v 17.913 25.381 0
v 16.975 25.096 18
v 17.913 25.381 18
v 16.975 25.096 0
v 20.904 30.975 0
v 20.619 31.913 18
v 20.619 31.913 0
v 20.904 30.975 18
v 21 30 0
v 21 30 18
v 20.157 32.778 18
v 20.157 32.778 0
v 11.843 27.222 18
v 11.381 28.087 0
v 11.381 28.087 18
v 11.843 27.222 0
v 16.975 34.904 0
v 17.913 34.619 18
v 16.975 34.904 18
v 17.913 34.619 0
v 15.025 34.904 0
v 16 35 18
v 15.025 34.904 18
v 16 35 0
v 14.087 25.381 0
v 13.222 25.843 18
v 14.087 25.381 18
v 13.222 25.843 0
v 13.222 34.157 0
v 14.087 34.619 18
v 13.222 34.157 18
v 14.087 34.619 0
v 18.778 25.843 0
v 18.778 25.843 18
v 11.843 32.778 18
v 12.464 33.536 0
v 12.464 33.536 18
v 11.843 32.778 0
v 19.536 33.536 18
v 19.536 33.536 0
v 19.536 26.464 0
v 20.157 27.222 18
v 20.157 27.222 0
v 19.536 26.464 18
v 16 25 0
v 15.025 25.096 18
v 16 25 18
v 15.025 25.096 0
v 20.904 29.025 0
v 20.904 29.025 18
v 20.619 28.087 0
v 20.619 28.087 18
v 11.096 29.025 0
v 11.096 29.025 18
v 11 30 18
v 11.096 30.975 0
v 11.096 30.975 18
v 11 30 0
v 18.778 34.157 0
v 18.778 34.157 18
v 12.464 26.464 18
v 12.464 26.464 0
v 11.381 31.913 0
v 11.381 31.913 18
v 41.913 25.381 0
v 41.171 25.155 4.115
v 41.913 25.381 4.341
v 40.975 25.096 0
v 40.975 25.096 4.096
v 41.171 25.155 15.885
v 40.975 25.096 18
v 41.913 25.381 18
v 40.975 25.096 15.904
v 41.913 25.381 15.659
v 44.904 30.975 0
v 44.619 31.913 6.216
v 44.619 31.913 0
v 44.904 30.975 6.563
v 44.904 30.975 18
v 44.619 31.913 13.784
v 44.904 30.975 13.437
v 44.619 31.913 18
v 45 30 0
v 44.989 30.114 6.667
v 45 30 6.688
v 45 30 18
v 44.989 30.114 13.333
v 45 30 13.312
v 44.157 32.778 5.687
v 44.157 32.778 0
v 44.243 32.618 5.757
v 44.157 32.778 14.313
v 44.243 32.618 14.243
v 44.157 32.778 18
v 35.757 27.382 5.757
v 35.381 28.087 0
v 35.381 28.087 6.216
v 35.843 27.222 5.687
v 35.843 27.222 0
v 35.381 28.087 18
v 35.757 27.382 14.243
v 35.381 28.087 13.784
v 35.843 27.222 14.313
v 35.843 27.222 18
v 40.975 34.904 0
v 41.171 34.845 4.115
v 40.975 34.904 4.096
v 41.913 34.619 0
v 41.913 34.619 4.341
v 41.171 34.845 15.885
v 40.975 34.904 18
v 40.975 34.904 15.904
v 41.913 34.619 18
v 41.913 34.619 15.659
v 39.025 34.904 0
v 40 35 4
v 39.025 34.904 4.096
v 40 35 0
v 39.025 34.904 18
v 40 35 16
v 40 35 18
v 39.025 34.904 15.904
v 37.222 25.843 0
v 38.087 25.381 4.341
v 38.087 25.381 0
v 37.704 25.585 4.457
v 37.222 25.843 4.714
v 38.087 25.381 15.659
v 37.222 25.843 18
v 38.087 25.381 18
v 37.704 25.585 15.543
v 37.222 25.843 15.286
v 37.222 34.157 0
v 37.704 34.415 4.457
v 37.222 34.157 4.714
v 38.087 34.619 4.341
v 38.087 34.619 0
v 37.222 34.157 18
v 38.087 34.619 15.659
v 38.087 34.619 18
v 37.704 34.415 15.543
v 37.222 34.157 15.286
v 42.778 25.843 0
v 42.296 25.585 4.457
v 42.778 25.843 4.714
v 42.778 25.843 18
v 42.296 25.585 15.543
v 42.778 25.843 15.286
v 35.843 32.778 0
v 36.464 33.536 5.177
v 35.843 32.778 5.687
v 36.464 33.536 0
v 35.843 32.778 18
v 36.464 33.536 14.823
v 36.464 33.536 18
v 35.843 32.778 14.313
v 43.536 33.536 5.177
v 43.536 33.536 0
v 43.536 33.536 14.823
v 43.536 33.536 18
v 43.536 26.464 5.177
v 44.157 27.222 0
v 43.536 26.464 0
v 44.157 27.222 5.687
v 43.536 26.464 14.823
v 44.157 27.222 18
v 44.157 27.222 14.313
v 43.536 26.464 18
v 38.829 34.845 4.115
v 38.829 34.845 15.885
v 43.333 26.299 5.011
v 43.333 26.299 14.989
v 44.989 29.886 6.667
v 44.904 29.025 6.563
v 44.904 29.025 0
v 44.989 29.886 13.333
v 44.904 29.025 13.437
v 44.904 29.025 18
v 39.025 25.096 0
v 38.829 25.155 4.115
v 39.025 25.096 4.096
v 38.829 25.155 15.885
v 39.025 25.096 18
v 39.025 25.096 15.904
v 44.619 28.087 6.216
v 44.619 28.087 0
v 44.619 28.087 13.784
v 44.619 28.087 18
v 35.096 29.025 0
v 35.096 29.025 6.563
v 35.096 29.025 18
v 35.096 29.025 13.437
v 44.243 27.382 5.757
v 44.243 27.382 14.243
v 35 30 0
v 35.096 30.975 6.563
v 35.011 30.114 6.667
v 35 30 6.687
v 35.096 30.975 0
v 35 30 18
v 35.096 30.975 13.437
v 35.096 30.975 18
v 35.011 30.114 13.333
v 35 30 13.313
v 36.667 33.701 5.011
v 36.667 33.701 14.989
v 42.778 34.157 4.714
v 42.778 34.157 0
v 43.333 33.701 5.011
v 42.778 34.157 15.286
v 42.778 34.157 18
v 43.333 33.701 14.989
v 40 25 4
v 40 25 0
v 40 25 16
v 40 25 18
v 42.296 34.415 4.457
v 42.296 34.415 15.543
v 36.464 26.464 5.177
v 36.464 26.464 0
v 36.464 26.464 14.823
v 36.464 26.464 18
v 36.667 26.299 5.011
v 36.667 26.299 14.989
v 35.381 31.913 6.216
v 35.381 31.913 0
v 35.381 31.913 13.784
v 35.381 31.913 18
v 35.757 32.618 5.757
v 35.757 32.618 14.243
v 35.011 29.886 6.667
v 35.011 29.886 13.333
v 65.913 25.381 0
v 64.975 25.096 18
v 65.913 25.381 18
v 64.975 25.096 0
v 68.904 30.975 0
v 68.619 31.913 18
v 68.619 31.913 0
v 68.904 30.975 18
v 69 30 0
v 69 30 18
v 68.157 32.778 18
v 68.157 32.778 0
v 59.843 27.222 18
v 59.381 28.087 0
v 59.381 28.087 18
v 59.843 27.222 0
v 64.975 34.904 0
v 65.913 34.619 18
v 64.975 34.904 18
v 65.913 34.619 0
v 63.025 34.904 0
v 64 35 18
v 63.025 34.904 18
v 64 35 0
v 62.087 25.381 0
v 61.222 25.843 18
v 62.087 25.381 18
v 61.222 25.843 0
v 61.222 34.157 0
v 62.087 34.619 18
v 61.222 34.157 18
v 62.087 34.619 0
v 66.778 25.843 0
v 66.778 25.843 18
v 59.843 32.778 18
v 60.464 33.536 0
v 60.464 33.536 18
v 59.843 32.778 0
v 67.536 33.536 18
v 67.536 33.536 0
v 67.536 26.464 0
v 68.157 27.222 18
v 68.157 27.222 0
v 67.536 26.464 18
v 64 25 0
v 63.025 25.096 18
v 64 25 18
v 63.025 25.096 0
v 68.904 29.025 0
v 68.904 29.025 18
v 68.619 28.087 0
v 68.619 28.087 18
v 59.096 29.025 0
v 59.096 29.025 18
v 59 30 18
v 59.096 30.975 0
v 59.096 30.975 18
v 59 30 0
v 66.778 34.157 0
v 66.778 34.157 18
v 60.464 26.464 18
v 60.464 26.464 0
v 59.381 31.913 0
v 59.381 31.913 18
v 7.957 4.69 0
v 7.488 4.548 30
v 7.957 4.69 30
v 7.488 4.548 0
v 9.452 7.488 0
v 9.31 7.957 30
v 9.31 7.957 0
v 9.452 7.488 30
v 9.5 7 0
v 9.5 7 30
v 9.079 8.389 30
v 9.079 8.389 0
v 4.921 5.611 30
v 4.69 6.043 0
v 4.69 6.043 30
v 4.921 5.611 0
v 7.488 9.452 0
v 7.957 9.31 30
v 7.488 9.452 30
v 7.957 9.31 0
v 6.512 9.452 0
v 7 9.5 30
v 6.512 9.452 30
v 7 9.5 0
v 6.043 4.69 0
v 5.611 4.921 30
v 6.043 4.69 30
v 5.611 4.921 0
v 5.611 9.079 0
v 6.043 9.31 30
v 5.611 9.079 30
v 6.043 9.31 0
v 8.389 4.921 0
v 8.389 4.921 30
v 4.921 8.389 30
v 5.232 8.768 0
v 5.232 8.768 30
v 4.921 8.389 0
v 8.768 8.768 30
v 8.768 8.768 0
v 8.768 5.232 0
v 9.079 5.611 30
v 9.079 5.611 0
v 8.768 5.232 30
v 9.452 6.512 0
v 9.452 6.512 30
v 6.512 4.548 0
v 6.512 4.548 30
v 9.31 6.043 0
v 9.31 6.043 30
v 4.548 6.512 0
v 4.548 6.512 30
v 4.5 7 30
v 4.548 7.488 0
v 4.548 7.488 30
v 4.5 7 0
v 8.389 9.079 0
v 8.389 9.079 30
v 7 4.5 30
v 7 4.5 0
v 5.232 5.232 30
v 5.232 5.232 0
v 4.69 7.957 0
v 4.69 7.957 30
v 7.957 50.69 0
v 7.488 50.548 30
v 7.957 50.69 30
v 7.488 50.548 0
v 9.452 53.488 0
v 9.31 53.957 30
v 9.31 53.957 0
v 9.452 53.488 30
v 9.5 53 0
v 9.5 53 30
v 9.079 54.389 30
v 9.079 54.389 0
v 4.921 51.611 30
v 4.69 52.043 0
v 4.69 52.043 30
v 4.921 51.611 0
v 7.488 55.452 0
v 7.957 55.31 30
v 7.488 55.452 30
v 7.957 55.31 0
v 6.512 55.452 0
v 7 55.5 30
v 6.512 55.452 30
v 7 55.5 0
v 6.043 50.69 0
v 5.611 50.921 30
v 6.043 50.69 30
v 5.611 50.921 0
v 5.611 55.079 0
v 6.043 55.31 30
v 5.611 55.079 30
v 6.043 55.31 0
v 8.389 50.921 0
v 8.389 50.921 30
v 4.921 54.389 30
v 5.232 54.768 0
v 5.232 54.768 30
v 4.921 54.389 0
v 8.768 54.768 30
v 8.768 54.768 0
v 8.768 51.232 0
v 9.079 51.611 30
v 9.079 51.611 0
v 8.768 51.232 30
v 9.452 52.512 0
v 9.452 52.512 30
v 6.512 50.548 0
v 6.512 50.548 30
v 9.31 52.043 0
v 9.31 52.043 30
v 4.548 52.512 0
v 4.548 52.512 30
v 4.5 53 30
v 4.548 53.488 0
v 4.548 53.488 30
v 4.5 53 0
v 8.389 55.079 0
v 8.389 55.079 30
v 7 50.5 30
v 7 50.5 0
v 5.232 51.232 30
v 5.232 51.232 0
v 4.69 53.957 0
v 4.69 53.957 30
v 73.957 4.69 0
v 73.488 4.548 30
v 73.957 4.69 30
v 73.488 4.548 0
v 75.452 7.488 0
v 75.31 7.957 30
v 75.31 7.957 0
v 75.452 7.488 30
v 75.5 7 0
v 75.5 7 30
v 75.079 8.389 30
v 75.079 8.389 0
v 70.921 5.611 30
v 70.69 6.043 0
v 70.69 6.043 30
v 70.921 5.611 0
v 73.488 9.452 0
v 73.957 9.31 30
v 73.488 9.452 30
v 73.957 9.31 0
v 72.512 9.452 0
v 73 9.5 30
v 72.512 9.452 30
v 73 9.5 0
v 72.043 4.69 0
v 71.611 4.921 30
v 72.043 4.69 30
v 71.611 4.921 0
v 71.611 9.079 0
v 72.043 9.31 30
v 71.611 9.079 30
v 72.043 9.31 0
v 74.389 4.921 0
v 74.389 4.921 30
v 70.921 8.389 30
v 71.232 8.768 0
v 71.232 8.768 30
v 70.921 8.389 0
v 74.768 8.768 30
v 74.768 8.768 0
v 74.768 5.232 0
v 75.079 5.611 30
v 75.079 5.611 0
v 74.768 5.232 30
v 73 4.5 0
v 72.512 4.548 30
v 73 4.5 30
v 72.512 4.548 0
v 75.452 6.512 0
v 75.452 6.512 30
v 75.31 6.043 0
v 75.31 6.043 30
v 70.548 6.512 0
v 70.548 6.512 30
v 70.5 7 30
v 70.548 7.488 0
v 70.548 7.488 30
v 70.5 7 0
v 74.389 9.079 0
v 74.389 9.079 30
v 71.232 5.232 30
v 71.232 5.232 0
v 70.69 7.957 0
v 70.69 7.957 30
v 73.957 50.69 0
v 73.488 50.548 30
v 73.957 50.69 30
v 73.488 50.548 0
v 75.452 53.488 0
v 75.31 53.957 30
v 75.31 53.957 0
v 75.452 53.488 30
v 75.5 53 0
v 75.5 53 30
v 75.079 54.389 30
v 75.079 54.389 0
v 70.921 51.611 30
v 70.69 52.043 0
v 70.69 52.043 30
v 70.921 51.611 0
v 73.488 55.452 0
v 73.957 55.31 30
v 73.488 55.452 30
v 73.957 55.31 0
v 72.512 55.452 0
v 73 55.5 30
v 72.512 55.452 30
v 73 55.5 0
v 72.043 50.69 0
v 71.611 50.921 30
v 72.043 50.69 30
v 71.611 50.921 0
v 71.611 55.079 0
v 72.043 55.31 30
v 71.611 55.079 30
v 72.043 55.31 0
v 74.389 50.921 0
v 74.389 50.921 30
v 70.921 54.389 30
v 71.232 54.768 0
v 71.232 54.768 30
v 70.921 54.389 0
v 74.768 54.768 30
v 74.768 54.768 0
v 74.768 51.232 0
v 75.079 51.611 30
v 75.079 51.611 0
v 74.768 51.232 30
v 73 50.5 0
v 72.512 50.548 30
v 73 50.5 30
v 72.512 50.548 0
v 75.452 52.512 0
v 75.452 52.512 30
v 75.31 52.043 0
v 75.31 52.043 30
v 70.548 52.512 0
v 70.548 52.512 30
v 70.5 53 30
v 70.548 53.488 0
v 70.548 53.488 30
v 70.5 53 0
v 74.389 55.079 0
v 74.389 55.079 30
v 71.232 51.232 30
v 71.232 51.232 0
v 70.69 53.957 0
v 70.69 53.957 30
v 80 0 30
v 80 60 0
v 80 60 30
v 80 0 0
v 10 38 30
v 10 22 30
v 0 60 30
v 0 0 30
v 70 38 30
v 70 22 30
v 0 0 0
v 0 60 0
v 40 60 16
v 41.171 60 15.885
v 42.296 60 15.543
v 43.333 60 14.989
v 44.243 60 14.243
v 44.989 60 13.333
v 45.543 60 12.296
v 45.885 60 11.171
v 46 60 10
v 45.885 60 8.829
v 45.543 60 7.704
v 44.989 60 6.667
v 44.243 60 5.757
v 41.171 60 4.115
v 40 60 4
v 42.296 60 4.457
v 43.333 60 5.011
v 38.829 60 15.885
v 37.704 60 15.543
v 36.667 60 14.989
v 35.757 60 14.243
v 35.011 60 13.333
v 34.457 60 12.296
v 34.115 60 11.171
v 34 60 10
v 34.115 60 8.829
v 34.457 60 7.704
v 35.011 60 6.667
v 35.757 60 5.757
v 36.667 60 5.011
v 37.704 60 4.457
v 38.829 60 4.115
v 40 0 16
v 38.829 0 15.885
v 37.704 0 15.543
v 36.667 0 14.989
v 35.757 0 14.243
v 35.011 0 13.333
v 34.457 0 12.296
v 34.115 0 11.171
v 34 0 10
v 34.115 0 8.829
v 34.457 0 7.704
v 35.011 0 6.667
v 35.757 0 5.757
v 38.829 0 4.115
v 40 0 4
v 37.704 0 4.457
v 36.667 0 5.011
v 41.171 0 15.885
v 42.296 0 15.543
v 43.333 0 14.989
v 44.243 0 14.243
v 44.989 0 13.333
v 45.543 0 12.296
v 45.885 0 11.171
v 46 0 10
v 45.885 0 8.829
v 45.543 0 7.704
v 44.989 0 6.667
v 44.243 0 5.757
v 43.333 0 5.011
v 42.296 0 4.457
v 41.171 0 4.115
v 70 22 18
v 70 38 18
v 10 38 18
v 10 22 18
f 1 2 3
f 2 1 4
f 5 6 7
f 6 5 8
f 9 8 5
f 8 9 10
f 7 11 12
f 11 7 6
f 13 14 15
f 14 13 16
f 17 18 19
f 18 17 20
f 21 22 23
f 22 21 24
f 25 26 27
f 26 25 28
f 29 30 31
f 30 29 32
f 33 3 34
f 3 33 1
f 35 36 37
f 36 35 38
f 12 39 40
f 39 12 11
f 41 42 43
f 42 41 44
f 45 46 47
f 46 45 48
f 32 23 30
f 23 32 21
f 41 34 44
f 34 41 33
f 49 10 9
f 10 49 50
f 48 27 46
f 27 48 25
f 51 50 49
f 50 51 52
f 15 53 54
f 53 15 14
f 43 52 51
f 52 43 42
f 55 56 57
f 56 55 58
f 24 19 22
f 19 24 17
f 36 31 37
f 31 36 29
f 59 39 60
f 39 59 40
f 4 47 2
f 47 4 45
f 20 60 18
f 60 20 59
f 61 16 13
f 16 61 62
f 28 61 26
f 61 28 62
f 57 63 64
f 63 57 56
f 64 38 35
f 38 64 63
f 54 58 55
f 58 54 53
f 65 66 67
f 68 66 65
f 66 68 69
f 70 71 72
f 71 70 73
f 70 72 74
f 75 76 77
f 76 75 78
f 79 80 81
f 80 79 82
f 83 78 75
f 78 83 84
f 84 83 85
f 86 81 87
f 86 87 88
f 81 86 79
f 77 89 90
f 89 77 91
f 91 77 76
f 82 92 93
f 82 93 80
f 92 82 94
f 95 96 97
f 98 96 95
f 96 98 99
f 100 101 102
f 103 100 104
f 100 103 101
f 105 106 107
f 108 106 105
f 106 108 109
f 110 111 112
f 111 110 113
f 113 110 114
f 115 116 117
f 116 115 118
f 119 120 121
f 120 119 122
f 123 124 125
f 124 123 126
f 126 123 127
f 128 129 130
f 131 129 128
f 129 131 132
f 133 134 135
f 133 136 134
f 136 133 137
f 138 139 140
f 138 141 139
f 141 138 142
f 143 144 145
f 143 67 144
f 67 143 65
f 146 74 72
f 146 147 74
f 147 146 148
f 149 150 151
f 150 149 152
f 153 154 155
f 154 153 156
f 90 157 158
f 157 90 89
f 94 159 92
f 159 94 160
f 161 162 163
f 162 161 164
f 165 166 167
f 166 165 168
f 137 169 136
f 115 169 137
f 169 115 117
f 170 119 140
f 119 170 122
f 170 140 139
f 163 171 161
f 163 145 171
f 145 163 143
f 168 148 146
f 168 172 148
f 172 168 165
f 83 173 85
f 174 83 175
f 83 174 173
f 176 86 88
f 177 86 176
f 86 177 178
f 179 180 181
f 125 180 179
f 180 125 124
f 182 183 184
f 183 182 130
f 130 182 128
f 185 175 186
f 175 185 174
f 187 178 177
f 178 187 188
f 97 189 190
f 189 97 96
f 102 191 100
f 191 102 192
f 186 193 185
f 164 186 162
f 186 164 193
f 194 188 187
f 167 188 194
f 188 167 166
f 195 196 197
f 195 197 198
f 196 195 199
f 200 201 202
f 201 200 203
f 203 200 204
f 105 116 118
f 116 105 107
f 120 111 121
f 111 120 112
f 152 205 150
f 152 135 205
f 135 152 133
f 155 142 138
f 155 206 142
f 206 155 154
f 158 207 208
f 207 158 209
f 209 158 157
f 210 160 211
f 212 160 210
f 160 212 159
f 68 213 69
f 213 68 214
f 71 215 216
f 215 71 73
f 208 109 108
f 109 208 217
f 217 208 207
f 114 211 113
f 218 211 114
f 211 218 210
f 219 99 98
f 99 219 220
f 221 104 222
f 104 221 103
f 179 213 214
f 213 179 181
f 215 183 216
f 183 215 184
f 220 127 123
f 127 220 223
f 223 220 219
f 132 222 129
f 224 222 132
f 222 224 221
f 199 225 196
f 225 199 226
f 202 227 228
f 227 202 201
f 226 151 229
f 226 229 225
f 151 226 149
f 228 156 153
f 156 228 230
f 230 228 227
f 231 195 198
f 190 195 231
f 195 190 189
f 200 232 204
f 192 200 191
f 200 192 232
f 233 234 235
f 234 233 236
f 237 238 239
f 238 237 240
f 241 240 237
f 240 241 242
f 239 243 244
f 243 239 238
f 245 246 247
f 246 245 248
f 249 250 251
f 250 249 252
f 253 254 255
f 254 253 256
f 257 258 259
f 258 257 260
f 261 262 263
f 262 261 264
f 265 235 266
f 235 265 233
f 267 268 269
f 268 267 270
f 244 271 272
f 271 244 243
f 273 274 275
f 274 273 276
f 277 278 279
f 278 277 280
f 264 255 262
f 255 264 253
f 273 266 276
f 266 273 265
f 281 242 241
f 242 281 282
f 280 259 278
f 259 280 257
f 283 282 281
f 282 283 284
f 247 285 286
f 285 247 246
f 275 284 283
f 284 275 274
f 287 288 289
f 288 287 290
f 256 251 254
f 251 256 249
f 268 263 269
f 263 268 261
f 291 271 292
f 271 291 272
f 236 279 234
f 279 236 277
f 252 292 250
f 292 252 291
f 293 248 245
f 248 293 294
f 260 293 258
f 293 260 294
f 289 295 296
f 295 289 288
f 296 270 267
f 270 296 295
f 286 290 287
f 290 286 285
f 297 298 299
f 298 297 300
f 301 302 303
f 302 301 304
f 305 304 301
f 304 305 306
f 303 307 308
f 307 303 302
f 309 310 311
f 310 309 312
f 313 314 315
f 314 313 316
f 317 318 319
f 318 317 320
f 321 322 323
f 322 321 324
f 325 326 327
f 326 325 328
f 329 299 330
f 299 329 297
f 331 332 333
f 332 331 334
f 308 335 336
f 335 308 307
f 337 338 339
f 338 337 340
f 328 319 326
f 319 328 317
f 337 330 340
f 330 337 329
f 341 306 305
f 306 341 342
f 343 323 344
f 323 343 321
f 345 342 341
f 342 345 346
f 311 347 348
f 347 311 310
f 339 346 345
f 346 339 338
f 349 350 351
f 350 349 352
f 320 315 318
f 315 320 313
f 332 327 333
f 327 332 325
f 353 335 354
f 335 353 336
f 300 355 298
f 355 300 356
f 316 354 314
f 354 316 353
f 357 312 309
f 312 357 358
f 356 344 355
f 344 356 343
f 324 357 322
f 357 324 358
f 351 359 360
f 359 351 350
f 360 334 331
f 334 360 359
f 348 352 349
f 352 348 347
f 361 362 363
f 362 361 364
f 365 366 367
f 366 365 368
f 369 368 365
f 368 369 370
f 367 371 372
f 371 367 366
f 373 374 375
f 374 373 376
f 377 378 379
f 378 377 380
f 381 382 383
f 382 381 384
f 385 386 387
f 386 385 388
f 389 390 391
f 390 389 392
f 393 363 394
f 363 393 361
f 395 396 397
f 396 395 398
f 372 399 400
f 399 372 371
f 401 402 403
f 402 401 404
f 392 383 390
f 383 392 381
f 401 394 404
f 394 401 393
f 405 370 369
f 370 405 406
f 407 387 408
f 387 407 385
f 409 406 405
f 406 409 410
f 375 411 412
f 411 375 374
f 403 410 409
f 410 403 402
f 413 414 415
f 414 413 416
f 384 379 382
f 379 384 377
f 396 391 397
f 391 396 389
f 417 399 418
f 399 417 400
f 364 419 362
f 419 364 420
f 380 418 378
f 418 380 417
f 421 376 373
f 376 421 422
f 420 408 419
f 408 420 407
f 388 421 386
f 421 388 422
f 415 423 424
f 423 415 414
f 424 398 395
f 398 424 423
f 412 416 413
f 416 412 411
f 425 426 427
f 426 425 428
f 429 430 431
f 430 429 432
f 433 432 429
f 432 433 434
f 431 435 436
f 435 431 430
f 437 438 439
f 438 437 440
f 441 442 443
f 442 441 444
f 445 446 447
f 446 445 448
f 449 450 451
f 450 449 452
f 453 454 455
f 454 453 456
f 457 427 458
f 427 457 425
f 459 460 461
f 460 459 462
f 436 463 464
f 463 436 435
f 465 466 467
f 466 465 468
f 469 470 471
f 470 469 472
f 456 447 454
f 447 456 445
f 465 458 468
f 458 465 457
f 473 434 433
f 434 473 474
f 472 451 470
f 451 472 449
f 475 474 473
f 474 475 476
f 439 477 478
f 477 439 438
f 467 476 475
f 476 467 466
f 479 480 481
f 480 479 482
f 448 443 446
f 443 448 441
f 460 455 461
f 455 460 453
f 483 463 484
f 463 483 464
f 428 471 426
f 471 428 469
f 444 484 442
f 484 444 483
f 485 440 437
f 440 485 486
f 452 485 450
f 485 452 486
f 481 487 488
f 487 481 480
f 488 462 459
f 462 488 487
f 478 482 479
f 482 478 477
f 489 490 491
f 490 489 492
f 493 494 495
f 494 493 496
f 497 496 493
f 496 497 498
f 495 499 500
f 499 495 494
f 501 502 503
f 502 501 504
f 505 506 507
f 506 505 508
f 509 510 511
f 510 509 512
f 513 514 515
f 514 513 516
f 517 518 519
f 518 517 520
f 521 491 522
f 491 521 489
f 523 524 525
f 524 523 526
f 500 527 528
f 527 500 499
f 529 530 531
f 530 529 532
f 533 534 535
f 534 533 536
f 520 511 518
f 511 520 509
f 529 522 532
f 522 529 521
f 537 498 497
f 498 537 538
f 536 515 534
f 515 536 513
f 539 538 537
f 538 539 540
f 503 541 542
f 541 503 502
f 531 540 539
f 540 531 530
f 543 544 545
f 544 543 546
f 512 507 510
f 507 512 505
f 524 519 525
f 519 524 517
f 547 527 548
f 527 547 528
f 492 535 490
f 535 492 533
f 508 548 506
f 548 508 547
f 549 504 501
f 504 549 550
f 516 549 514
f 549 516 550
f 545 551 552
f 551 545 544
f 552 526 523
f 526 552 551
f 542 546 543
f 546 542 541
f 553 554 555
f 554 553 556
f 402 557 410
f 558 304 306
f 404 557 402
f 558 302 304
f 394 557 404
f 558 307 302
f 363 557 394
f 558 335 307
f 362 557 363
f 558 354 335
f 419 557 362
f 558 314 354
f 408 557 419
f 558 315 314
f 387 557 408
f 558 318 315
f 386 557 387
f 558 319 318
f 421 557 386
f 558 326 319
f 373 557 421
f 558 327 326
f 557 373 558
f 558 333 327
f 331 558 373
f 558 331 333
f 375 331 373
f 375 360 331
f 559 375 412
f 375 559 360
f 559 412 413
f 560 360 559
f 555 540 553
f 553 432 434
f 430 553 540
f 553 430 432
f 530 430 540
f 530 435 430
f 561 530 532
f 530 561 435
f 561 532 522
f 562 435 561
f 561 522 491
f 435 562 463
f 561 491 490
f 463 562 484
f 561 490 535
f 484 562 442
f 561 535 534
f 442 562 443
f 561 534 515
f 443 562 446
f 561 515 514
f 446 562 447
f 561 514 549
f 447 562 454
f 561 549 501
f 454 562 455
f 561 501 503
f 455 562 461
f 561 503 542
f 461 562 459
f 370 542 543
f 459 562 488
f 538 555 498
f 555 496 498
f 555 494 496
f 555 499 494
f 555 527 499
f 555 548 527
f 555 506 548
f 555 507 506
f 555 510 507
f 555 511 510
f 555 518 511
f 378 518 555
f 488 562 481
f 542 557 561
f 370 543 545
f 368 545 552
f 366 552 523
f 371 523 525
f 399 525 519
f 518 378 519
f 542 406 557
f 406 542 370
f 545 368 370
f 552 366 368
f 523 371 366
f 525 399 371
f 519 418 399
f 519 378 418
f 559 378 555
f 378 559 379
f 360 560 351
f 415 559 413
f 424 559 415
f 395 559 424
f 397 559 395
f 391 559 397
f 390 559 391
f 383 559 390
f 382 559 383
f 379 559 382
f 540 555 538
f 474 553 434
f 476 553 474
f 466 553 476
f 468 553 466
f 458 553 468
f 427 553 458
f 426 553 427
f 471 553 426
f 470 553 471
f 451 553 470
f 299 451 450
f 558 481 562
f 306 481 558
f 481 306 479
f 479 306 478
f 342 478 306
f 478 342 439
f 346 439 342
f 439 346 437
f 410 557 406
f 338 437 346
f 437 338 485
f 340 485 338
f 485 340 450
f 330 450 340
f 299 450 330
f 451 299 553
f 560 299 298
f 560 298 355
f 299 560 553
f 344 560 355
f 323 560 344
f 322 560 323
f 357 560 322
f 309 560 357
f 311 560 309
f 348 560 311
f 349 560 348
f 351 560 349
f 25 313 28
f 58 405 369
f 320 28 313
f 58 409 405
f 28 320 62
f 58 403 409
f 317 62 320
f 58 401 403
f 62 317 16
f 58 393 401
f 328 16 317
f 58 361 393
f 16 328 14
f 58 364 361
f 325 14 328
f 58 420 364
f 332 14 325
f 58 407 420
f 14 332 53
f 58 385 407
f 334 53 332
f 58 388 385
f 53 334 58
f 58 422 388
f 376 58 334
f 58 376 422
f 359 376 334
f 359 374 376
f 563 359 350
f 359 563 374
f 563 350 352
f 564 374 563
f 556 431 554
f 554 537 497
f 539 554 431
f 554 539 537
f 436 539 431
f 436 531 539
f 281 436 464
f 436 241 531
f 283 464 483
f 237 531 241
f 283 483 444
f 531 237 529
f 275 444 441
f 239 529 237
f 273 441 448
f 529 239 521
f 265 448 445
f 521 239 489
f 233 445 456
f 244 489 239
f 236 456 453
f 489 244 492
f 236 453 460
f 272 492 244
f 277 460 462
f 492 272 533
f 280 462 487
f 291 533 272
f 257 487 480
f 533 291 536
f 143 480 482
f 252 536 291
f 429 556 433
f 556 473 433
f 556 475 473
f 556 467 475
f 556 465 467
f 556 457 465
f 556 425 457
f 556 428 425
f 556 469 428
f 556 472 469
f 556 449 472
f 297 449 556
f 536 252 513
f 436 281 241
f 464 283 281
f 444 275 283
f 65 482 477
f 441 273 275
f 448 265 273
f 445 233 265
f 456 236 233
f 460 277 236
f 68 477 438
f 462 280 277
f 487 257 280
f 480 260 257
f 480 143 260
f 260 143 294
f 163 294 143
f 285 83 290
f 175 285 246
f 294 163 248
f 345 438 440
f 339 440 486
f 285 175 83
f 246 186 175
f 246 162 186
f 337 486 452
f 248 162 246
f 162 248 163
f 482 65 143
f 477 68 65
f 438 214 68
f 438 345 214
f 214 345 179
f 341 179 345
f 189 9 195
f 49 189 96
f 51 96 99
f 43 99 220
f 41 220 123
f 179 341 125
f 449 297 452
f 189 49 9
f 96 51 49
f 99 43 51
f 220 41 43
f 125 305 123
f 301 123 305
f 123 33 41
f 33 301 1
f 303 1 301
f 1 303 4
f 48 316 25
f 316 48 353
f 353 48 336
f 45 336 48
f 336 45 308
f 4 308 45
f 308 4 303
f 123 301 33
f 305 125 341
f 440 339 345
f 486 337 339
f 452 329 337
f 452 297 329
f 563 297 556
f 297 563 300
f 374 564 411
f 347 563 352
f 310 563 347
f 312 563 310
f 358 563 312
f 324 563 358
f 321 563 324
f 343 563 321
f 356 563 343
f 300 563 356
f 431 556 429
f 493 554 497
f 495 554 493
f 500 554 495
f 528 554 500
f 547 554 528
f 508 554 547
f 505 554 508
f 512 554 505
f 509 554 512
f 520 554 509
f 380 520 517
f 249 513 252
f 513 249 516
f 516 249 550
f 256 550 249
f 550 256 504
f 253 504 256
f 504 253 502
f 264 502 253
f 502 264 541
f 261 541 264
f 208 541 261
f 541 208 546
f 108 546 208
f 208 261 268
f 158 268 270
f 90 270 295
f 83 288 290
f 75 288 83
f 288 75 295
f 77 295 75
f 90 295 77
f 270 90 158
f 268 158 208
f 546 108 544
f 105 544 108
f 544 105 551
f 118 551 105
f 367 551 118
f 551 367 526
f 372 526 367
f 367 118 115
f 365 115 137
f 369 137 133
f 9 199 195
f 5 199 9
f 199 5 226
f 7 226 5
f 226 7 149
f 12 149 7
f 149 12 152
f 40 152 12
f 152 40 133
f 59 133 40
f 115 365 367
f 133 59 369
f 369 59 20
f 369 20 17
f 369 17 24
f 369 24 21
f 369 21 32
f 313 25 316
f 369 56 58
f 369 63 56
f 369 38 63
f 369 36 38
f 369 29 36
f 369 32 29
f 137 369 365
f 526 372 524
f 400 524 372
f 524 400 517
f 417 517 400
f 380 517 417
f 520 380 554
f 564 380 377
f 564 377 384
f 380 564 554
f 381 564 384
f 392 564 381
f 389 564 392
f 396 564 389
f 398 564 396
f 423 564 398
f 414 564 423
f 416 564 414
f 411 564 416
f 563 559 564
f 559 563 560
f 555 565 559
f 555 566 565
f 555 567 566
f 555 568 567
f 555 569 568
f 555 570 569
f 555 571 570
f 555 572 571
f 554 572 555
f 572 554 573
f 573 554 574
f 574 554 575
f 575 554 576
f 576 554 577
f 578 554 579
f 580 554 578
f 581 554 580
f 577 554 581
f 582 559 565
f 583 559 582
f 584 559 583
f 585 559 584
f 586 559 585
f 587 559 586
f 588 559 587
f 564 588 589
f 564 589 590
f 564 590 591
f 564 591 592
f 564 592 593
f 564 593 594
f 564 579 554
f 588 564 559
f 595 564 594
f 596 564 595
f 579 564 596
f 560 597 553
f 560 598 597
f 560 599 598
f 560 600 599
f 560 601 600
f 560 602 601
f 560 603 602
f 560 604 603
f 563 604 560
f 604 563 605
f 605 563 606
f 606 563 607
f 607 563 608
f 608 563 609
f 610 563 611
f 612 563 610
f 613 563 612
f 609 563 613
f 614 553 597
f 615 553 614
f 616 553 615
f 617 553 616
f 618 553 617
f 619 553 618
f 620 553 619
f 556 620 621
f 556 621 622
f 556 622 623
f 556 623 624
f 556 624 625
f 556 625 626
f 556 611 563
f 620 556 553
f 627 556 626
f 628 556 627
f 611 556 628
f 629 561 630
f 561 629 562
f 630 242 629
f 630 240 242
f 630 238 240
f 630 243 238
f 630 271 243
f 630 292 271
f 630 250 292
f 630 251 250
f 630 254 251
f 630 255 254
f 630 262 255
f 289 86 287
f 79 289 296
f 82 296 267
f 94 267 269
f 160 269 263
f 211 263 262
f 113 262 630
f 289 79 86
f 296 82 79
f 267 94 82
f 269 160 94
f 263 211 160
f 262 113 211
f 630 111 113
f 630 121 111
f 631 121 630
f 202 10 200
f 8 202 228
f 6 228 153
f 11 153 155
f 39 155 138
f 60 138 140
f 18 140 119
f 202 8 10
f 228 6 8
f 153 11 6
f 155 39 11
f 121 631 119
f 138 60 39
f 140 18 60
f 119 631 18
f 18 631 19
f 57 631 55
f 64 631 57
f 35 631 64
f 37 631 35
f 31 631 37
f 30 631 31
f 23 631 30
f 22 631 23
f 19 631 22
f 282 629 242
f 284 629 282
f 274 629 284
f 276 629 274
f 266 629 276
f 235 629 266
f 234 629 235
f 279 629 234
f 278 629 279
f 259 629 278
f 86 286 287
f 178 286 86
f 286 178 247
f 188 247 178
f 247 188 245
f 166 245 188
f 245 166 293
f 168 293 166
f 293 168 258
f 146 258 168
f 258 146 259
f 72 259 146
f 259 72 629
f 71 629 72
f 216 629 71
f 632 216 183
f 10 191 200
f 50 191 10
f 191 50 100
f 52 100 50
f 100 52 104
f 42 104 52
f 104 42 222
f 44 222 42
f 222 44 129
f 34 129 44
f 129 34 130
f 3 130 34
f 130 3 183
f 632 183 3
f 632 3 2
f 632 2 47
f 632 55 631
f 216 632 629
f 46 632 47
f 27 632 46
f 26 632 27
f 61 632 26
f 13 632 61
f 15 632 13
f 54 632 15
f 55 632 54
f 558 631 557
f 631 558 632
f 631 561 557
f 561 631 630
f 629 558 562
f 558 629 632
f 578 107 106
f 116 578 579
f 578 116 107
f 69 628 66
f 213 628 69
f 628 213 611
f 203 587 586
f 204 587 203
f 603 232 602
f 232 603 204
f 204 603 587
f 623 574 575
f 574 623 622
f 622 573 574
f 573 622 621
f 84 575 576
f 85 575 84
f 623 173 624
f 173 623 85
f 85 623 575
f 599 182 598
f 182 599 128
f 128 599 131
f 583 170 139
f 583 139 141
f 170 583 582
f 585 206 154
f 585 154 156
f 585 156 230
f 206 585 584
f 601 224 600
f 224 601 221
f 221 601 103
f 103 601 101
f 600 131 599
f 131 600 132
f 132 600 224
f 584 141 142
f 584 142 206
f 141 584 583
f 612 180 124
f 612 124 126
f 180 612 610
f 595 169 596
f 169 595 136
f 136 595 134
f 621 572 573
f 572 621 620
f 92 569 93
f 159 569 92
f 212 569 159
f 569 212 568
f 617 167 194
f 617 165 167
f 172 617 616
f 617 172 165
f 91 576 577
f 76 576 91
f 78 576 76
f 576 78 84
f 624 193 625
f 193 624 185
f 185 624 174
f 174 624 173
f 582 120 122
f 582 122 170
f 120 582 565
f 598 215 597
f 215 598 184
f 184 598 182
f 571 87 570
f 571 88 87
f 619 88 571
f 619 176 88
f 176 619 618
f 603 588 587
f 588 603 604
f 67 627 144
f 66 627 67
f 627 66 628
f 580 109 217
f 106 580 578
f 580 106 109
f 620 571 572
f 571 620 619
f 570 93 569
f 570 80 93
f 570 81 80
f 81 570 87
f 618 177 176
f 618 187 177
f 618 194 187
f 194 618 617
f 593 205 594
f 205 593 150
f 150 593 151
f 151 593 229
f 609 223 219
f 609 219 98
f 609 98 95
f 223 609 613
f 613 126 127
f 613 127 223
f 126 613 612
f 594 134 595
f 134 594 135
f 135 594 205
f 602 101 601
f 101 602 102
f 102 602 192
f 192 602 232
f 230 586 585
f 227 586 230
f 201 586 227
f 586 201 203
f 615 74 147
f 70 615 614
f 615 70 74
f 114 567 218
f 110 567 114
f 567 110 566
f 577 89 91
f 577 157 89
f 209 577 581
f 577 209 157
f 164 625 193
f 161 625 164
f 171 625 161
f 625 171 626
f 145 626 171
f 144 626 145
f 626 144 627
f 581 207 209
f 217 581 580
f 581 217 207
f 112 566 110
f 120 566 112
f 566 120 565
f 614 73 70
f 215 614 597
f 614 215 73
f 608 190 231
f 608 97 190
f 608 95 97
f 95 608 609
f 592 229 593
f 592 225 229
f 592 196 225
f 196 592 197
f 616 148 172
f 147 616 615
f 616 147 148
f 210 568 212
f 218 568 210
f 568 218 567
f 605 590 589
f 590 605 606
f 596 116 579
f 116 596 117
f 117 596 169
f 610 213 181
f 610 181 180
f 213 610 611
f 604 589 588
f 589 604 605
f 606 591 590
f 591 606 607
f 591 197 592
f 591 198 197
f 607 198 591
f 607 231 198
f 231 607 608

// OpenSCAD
$fn = 32;

// ----------------------------------------------------------------------
// Manifold block: side_outlet manifold
// ----------------------------------------------------------------------

// --- parameters (mm) ---
block_l = 80;             // block length, X
block_w = 60;             // block width, Y
block_h = 30;             // block height, Z
port_d = 10;              // port bore diameter
port_pitch = 24;          // port pitch along X
gallery_d = 16;           // top gallery width, Y
gallery_depth = 12;       // gallery pocket depth
wall_p = 10;              // gallery end wall thickness, X
mnt_d = 5;                // mounting hole diameter
mnt_in = 7;               // mounting hole inset from the edges
out_d = 12;               // outlet bore diameter
out_z = 10;               // outlet axis height

n_ports = 3;  // ports in the row
port_x0 = (block_l - (n_ports - 1) * port_pitch) / 2;  // first port X

difference() {
  cube([block_l, block_w, block_h]);
  for (i = [0 : n_ports - 1])
    translate([port_x0 + i * port_pitch, block_w / 2, -1])
      cylinder(h = block_h + 2, d = port_d);
  translate([wall_p, block_w / 2 - gallery_d / 2, block_h - gallery_depth])
    cube([block_l - 2 * wall_p, gallery_d, gallery_depth + 1]);
  for (cx = [mnt_in, block_l - mnt_in])
    for (cy = [mnt_in, block_w - mnt_in])
      translate([cx, cy, -1]) cylinder(h = block_h + 2, d = mnt_d);
  translate([block_l / 2, -1, out_z]) rotate([-90, 0, 0])
    cylinder(h = block_w + 2, d = out_d);
}
